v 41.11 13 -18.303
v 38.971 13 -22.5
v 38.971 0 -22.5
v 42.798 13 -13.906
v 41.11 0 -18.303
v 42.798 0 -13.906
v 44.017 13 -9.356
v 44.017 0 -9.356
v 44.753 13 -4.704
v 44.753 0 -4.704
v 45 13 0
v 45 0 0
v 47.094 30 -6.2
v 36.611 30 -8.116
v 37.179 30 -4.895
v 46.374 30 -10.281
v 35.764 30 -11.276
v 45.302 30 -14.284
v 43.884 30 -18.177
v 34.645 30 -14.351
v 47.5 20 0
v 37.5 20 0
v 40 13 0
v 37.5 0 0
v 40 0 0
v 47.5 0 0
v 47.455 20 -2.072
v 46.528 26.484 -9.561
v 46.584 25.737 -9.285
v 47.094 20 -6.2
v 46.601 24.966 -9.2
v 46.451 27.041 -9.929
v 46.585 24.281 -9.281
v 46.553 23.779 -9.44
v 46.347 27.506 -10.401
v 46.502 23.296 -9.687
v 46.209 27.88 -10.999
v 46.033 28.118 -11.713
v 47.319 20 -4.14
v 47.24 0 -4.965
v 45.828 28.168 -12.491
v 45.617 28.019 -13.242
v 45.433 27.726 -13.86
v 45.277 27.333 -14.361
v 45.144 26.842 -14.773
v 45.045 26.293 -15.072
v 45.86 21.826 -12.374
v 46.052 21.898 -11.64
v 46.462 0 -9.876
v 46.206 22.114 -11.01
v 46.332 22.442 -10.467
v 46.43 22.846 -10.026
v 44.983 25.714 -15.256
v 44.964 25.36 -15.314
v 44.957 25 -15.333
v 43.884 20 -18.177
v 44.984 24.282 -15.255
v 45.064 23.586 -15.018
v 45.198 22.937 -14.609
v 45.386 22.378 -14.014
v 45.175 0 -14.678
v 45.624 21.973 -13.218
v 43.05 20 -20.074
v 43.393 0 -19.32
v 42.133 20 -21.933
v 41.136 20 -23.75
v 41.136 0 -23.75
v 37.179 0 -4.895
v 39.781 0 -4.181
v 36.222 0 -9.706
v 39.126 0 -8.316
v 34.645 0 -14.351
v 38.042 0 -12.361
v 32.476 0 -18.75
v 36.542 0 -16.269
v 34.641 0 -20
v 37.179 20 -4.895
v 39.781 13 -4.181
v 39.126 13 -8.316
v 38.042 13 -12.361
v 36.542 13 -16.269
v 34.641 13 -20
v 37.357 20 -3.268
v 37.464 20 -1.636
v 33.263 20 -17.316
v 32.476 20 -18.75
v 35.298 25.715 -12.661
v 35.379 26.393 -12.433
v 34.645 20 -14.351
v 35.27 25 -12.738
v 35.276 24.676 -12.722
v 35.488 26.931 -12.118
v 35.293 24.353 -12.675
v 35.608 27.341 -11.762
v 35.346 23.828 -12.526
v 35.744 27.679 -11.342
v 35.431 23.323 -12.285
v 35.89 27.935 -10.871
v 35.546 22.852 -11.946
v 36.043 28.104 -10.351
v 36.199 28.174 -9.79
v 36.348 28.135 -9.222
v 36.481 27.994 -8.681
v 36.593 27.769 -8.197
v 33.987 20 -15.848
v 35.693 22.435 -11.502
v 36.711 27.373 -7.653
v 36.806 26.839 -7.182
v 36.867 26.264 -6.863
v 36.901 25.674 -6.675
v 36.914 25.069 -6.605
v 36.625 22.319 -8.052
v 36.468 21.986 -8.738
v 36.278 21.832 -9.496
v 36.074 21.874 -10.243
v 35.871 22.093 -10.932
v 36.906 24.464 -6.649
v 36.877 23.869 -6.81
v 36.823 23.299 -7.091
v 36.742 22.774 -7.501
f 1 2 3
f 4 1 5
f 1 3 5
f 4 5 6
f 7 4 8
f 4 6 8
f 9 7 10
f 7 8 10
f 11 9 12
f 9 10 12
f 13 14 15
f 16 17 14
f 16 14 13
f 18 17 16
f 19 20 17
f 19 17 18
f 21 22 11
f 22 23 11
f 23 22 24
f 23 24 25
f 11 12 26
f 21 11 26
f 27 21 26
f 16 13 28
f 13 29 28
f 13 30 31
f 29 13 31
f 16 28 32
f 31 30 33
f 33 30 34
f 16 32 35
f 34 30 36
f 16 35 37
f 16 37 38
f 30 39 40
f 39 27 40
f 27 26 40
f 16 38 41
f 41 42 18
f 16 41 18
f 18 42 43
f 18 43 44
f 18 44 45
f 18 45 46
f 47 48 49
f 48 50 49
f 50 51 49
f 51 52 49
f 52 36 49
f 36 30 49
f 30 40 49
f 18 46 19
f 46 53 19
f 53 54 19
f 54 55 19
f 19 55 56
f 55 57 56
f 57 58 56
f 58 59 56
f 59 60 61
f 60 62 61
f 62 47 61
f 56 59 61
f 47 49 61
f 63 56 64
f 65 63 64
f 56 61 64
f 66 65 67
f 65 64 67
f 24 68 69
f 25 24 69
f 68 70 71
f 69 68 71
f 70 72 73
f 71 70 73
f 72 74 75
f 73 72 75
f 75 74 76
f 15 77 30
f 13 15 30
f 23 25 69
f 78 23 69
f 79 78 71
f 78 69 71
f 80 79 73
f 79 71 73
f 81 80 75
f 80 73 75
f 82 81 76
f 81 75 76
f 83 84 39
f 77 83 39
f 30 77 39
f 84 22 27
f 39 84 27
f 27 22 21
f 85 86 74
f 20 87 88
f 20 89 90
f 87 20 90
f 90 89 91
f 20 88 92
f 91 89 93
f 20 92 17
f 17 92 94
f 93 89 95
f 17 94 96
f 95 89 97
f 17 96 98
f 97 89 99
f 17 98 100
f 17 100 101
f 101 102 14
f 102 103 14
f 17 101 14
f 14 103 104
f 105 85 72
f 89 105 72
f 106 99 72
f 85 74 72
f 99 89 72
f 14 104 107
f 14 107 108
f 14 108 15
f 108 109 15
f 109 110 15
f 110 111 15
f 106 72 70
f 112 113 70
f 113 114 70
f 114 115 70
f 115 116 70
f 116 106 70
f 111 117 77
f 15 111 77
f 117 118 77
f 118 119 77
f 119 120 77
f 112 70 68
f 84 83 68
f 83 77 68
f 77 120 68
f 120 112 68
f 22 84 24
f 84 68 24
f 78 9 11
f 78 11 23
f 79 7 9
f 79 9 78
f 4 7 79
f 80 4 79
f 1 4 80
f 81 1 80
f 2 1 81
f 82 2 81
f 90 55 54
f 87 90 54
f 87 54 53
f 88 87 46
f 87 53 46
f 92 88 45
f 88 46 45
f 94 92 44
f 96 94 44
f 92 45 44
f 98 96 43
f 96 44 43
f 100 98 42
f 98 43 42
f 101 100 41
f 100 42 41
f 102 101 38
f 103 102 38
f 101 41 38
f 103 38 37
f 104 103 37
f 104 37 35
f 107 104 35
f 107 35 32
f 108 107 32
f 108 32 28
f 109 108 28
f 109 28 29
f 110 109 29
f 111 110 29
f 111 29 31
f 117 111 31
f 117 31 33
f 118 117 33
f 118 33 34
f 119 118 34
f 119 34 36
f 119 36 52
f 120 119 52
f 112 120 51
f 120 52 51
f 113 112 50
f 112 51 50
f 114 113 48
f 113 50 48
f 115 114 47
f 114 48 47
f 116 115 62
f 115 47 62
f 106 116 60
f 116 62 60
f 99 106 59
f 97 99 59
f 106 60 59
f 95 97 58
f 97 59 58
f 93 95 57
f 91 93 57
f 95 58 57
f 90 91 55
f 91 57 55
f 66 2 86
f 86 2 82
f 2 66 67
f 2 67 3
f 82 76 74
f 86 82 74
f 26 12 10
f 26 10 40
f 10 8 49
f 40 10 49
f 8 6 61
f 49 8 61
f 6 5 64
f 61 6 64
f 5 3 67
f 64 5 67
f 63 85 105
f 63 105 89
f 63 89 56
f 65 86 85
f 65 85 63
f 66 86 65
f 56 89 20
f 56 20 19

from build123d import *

# Parameters (mm, degrees)
BOSS_EXTRUDE1_DEPTH = 30
CUT_EXTRUDE1_DEPTH  = 13
CUT_EXTRUDE2_START  = -10
CUT_EXTRUDE2_DEPTH  = 10
SKETCH6_R           = 3.175
CUT_EXTRUDE3_DEPTH  = 36.083445782


with BuildPart() as part:
    # Sketch3 → Boss-Extrude1 (new body)
    with BuildSketch(Plane(origin=(0, 0, 0), x_dir=(1, 0, 0), z_dir=(0, 1, 0))):
        with BuildLine():
            Line((37.5, 0), (47.5, 0))
            ThreePointArc((47.5, 0), (45.881476749, 12.293904642), (41.13620668, 23.75))
            Line((41.13620668, 23.75), (32.475952642, 18.75))
            ThreePointArc((32.475952642, 18.75), (36.222218486, 9.705714191), (37.5, 0))
        make_face()
    extrude(amount=BOSS_EXTRUDE1_DEPTH)

    # Sketch4 → Cut-Extrude1 (cut)
    with BuildSketch(Plane(origin=(0, 0, 0), x_dir=(1, 0, 0), z_dir=(0, 1, 0))):
        with BuildLine():
            Line((34.641016151, 20), (38.97114317, 22.5))
            ThreePointArc((38.97114317, 22.5), (43.466662183, 11.64685703), (45, 0))
            Line((45, 0), (40, 0))
            ThreePointArc((40, 0), (38.637033052, 10.352761804), (34.641016151, 20))
        make_face()
    extrude(amount=CUT_EXTRUDE1_DEPTH, mode=Mode.SUBTRACT)

    # Sketch5 → Cut-Extrude2 (cut)
    with BuildSketch(Plane(origin=(0, 30, 0), x_dir=(1, 0, 0), z_dir=(0, 1, 0)).offset(CUT_EXTRUDE2_START)):
        with BuildLine():
            Line((41.13620668, 23.75), (32.475952642, 18.75))
            ThreePointArc((32.475952642, 18.75), (33.632727807, 16.585825883), (34.645482469, 14.350628714))
            Line((34.645482469, 14.350628714), (43.884277794, 18.177463037))
            ThreePointArc((43.884277794, 18.177463037), (42.601455223, 21.008712785), (41.13620668, 23.75))
        make_face()
    cut_extrude2 = extrude(amount=CUT_EXTRUDE2_DEPTH, mode=Mode.SUBTRACT)

    # Mirror1: Cut-Extrude2 across plane
    add(cut_extrude2.mirror(Plane(origin=(0, 0, 0), x_dir=(0.9659258262890681, 0, -0.25881904510252135), z_dir=(0.25881904510252135, 0, 0.9659258262890681))), mode=Mode.SUBTRACT)

    # Sketch6 → Cut-Extrude3 (cut, through all)
    with BuildSketch(Plane(origin=(45.881476749, 0, -12.293904642), x_dir=(-0.25881904510252135, 0, -0.9659258262890682), z_dir=(0.9659258262890681, 0, -0.2588190451025213))):
        with Locations((0, 25)):
            Circle(SKETCH6_R)
    extrude(amount=-CUT_EXTRUDE3_DEPTH, mode=Mode.SUBTRACT)


solid = part.part
